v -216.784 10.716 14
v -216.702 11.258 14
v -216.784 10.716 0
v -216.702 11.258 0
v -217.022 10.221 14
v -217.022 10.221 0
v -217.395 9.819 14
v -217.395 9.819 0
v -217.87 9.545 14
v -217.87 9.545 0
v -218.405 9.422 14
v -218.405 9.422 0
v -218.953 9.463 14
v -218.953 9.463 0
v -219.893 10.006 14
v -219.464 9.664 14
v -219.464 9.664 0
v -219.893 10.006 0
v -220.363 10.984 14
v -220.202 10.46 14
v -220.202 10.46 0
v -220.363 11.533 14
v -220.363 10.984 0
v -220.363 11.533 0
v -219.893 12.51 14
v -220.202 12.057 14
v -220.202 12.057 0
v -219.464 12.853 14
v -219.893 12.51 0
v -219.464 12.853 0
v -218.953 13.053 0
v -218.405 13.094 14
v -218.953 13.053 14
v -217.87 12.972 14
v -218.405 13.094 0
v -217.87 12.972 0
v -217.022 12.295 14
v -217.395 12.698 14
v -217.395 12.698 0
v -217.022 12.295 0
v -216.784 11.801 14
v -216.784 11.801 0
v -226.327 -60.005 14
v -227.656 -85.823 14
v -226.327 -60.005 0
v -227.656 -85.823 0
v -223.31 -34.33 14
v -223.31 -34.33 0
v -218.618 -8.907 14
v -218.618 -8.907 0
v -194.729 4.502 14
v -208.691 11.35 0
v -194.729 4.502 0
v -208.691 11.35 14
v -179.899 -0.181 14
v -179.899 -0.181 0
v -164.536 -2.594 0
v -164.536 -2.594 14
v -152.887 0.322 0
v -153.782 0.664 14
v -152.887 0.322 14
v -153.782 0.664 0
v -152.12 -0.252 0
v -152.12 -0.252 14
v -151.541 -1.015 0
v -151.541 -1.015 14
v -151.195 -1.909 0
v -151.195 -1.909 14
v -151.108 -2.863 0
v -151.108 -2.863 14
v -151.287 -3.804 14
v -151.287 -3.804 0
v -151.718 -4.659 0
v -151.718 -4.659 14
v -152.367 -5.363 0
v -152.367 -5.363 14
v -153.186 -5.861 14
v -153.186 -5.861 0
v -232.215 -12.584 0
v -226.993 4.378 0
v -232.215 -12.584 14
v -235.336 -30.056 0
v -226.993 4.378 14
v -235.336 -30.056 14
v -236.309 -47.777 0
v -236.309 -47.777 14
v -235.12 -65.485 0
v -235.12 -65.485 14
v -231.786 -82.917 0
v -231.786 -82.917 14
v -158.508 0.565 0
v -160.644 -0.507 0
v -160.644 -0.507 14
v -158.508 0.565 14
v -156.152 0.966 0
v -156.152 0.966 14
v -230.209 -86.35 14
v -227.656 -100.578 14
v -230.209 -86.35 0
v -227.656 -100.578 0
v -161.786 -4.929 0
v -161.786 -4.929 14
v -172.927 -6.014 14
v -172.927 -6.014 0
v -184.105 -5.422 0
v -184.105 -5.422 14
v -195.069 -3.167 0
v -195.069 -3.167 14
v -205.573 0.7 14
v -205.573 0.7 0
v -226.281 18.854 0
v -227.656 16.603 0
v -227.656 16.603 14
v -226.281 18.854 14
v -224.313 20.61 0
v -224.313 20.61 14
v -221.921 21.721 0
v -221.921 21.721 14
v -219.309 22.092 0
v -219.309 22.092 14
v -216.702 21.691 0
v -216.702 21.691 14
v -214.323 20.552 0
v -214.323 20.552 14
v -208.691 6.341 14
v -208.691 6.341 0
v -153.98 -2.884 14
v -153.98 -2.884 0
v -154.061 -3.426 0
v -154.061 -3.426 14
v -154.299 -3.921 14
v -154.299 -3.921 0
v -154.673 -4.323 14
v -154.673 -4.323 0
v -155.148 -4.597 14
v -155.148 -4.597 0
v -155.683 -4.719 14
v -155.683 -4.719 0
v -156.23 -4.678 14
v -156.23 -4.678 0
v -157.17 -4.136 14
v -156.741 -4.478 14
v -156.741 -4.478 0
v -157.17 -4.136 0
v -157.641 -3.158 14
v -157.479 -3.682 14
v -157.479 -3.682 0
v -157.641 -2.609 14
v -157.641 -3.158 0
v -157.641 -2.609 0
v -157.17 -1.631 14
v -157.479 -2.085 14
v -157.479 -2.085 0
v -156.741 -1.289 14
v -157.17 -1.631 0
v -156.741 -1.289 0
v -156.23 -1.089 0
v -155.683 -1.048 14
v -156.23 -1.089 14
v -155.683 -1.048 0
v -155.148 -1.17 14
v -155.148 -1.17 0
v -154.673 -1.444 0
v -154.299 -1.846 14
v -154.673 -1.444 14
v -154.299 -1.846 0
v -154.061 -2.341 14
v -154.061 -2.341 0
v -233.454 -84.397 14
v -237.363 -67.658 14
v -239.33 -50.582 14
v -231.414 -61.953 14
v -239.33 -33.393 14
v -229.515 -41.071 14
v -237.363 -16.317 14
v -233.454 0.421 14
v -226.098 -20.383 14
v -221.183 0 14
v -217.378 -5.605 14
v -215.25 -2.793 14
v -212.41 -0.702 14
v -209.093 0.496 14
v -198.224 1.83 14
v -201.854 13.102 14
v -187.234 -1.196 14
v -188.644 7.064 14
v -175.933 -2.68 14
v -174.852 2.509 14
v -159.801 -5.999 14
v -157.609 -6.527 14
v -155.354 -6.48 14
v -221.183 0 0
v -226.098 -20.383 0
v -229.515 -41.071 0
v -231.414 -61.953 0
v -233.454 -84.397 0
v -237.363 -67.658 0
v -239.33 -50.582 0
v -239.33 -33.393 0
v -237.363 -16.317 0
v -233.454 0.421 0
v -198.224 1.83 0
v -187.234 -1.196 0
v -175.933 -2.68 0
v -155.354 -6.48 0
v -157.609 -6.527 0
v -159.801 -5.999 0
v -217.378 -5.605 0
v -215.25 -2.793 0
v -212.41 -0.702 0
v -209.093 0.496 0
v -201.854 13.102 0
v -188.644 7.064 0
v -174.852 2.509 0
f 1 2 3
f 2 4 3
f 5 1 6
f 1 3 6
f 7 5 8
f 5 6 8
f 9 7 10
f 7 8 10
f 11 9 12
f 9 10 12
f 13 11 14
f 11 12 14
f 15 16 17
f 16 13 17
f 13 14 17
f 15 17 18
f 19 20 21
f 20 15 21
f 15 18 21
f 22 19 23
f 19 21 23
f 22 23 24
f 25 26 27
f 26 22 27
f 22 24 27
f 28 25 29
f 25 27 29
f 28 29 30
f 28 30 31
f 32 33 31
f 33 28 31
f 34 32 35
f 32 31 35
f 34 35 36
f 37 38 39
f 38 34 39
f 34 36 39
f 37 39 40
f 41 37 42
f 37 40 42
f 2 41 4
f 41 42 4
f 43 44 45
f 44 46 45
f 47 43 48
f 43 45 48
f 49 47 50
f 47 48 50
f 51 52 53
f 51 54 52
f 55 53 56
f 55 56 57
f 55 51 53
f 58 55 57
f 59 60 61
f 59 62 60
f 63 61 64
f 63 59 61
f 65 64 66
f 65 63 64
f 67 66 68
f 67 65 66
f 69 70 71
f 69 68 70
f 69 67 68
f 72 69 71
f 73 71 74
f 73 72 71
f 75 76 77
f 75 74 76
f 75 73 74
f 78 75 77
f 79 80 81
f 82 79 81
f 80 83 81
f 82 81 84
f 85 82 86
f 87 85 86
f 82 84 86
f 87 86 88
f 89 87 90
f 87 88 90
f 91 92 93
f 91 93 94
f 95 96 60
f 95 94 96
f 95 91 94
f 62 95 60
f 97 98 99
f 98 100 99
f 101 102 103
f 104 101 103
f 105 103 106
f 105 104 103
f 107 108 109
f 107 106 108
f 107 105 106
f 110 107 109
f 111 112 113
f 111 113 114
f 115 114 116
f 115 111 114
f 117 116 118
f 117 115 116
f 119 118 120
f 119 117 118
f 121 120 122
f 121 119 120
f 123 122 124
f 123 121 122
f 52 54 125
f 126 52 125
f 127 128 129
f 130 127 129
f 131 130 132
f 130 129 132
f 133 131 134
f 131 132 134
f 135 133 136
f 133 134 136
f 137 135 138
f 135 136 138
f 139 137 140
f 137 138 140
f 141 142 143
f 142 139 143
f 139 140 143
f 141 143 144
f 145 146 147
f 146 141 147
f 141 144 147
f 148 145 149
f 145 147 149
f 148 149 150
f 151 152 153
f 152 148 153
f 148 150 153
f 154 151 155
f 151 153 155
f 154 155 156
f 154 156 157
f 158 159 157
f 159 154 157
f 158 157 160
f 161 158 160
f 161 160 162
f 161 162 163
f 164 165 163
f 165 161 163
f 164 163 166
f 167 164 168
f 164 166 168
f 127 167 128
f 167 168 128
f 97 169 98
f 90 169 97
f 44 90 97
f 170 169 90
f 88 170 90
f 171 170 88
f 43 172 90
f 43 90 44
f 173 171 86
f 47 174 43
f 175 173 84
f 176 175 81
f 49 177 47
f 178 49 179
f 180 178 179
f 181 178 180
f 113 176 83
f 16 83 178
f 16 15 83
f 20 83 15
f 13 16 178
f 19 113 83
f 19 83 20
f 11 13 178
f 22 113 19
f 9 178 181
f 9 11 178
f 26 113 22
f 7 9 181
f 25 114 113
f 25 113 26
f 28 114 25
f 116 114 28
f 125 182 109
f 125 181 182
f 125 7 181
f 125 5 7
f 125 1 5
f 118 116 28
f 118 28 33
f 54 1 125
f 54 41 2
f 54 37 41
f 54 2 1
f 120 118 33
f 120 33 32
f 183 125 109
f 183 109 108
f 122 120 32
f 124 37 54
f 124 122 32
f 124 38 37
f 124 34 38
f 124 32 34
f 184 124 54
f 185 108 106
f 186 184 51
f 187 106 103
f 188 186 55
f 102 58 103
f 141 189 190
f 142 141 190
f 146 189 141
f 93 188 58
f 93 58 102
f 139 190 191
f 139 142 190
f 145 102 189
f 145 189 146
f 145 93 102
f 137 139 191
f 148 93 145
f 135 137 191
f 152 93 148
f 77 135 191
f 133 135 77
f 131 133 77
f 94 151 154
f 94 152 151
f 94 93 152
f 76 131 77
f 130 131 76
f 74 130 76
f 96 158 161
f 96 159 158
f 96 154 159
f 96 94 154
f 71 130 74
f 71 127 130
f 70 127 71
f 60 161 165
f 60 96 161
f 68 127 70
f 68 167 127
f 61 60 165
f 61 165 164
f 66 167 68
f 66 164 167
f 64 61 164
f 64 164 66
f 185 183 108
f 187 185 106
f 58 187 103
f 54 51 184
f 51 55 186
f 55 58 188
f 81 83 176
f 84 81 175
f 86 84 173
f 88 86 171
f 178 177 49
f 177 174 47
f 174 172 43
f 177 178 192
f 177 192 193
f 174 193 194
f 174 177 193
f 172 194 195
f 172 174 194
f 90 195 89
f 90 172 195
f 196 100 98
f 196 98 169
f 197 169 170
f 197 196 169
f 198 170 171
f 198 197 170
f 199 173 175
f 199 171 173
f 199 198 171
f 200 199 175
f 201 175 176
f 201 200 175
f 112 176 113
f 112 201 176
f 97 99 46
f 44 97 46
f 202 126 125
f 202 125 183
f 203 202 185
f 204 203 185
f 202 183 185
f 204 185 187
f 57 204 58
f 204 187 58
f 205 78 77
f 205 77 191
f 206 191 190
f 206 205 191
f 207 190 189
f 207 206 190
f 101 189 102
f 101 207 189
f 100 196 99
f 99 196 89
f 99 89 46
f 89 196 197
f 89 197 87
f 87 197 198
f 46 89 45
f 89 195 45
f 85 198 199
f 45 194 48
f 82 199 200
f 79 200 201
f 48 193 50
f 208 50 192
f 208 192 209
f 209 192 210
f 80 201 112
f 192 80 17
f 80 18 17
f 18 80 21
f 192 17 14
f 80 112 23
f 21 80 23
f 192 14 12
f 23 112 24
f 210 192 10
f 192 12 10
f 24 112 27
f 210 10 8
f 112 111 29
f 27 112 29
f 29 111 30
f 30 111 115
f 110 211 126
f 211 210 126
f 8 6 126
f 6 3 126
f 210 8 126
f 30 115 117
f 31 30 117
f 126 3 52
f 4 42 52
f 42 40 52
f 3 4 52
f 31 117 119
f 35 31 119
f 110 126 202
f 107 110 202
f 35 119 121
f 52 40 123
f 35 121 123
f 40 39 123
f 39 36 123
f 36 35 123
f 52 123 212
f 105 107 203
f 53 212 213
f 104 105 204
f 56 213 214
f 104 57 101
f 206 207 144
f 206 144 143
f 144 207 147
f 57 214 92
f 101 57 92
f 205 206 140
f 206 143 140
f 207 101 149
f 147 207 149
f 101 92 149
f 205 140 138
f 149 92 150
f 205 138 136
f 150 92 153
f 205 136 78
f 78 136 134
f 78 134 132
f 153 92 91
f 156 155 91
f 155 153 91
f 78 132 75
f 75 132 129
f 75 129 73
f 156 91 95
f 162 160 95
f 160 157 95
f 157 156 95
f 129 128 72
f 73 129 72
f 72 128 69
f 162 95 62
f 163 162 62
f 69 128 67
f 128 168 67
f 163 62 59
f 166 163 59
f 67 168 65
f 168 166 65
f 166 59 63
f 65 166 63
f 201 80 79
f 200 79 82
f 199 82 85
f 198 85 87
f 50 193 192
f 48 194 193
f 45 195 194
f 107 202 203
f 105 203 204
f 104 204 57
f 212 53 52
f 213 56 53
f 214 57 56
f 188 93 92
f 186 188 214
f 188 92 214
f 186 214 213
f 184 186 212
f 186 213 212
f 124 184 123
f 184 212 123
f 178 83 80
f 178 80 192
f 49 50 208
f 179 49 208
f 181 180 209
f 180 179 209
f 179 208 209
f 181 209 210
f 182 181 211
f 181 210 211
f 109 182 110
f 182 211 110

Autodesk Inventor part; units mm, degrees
ref_plane "YZ Plane" through (0, 0, 0) normal (1, 0, 0) x (0, 1, 0)
ref_plane "XZ Plane" through (0, 0, 0) normal (0, 1, 0) x (-1, 0, 0)
ref_plane "XY Plane" through (0, 0, 0) normal (0, 0, 1) x (1, 0, 0)
sketch "Sketch1" plane through (0, 0, 0) normal (0, 0, 1) x (1, 0, 0)
  circle A0 centre (-218.543, 11.2583) radius 1.841
  circle A1 centre (-155.8206, -2.8835) radius 1.841
  line L0 (-230.2092, -86.3504) -> (-227.6561, -85.8234)
  arc A2 (-218.6185, -8.9067) -> (-227.6561, -85.8234) centre (166.9594, -93.2007) ccw
  arc A3 (-205.5726, 0.7003) -> (-218.6185, -8.9067) centre (-206.6279, -11.5281) ccw
  arc A4 (-205.5726, 0.7003) -> (-161.7862, -4.929) centre (-174.5768, 68.6888) ccw
  arc A5 (-161.7862, -4.929) -> (-153.1858, -5.8609) centre (-156.6626, 2.2036) ccw
  arc A6 (-153.1858, -5.8609) -> (-153.782, 0.6635) centre (-154.5502, -2.6961) ccw
  arc A7 (-153.782, 0.6635) -> (-160.6438, -0.507) centre (-155.9827, -7.1338) ccw
  arc A8 (-214.3232, 20.5519) -> (-160.6438, -0.507) centre (-140.3024, 130.2877) ccw
  arc A9 (-214.3232, 20.5519) -> (-227.6561, 16.6026) centre (-219.3619, 13.0819) ccw
  arc A10 (-227.6561, 16.6026) -> (-227.6561, -100.5779) centre (-89.6281, -41.9876) ccw
  line L1 (-227.6561, -100.5779) -> (-230.2092, -86.3504)
  point P0 (0, 0)
  point P1 (-190.934, -110.2879)
extrude "Extrusion1" add sketch "Sketch1" along normal blind 14
sketch "Sketch2" plane through (0, 0, 14) normal (0, 0, 1) x (1, 0, 0)
  arc A0 (-226.9928, 4.3779) -> (-231.786, -82.917) centre (-90.6456, -46.8878) ccw
  arc A1 (-221.1828, 0) -> (-231.786, -82.917) centre (55.5969, -77.5303) ccw
  line L0 (-226.9928, 4.3779) -> (-221.1828, 0)
  arc A2 (-208.6913, 11.3499) -> (-164.5355, -2.5941) centre (-156.1757, 100.764) ccw
  arc A3 (-208.6913, 6.3406) -> (-164.5355, -2.5941) centre (-170.8567, 79.7445) ccw
  line L1 (-208.6913, 11.3499) -> (-208.6913, 6.3406)
  point P0 (0, 0)
extrude "Extrusion2" cut sketch "Sketch2" against normal blind 14
properties part number "Claw"
